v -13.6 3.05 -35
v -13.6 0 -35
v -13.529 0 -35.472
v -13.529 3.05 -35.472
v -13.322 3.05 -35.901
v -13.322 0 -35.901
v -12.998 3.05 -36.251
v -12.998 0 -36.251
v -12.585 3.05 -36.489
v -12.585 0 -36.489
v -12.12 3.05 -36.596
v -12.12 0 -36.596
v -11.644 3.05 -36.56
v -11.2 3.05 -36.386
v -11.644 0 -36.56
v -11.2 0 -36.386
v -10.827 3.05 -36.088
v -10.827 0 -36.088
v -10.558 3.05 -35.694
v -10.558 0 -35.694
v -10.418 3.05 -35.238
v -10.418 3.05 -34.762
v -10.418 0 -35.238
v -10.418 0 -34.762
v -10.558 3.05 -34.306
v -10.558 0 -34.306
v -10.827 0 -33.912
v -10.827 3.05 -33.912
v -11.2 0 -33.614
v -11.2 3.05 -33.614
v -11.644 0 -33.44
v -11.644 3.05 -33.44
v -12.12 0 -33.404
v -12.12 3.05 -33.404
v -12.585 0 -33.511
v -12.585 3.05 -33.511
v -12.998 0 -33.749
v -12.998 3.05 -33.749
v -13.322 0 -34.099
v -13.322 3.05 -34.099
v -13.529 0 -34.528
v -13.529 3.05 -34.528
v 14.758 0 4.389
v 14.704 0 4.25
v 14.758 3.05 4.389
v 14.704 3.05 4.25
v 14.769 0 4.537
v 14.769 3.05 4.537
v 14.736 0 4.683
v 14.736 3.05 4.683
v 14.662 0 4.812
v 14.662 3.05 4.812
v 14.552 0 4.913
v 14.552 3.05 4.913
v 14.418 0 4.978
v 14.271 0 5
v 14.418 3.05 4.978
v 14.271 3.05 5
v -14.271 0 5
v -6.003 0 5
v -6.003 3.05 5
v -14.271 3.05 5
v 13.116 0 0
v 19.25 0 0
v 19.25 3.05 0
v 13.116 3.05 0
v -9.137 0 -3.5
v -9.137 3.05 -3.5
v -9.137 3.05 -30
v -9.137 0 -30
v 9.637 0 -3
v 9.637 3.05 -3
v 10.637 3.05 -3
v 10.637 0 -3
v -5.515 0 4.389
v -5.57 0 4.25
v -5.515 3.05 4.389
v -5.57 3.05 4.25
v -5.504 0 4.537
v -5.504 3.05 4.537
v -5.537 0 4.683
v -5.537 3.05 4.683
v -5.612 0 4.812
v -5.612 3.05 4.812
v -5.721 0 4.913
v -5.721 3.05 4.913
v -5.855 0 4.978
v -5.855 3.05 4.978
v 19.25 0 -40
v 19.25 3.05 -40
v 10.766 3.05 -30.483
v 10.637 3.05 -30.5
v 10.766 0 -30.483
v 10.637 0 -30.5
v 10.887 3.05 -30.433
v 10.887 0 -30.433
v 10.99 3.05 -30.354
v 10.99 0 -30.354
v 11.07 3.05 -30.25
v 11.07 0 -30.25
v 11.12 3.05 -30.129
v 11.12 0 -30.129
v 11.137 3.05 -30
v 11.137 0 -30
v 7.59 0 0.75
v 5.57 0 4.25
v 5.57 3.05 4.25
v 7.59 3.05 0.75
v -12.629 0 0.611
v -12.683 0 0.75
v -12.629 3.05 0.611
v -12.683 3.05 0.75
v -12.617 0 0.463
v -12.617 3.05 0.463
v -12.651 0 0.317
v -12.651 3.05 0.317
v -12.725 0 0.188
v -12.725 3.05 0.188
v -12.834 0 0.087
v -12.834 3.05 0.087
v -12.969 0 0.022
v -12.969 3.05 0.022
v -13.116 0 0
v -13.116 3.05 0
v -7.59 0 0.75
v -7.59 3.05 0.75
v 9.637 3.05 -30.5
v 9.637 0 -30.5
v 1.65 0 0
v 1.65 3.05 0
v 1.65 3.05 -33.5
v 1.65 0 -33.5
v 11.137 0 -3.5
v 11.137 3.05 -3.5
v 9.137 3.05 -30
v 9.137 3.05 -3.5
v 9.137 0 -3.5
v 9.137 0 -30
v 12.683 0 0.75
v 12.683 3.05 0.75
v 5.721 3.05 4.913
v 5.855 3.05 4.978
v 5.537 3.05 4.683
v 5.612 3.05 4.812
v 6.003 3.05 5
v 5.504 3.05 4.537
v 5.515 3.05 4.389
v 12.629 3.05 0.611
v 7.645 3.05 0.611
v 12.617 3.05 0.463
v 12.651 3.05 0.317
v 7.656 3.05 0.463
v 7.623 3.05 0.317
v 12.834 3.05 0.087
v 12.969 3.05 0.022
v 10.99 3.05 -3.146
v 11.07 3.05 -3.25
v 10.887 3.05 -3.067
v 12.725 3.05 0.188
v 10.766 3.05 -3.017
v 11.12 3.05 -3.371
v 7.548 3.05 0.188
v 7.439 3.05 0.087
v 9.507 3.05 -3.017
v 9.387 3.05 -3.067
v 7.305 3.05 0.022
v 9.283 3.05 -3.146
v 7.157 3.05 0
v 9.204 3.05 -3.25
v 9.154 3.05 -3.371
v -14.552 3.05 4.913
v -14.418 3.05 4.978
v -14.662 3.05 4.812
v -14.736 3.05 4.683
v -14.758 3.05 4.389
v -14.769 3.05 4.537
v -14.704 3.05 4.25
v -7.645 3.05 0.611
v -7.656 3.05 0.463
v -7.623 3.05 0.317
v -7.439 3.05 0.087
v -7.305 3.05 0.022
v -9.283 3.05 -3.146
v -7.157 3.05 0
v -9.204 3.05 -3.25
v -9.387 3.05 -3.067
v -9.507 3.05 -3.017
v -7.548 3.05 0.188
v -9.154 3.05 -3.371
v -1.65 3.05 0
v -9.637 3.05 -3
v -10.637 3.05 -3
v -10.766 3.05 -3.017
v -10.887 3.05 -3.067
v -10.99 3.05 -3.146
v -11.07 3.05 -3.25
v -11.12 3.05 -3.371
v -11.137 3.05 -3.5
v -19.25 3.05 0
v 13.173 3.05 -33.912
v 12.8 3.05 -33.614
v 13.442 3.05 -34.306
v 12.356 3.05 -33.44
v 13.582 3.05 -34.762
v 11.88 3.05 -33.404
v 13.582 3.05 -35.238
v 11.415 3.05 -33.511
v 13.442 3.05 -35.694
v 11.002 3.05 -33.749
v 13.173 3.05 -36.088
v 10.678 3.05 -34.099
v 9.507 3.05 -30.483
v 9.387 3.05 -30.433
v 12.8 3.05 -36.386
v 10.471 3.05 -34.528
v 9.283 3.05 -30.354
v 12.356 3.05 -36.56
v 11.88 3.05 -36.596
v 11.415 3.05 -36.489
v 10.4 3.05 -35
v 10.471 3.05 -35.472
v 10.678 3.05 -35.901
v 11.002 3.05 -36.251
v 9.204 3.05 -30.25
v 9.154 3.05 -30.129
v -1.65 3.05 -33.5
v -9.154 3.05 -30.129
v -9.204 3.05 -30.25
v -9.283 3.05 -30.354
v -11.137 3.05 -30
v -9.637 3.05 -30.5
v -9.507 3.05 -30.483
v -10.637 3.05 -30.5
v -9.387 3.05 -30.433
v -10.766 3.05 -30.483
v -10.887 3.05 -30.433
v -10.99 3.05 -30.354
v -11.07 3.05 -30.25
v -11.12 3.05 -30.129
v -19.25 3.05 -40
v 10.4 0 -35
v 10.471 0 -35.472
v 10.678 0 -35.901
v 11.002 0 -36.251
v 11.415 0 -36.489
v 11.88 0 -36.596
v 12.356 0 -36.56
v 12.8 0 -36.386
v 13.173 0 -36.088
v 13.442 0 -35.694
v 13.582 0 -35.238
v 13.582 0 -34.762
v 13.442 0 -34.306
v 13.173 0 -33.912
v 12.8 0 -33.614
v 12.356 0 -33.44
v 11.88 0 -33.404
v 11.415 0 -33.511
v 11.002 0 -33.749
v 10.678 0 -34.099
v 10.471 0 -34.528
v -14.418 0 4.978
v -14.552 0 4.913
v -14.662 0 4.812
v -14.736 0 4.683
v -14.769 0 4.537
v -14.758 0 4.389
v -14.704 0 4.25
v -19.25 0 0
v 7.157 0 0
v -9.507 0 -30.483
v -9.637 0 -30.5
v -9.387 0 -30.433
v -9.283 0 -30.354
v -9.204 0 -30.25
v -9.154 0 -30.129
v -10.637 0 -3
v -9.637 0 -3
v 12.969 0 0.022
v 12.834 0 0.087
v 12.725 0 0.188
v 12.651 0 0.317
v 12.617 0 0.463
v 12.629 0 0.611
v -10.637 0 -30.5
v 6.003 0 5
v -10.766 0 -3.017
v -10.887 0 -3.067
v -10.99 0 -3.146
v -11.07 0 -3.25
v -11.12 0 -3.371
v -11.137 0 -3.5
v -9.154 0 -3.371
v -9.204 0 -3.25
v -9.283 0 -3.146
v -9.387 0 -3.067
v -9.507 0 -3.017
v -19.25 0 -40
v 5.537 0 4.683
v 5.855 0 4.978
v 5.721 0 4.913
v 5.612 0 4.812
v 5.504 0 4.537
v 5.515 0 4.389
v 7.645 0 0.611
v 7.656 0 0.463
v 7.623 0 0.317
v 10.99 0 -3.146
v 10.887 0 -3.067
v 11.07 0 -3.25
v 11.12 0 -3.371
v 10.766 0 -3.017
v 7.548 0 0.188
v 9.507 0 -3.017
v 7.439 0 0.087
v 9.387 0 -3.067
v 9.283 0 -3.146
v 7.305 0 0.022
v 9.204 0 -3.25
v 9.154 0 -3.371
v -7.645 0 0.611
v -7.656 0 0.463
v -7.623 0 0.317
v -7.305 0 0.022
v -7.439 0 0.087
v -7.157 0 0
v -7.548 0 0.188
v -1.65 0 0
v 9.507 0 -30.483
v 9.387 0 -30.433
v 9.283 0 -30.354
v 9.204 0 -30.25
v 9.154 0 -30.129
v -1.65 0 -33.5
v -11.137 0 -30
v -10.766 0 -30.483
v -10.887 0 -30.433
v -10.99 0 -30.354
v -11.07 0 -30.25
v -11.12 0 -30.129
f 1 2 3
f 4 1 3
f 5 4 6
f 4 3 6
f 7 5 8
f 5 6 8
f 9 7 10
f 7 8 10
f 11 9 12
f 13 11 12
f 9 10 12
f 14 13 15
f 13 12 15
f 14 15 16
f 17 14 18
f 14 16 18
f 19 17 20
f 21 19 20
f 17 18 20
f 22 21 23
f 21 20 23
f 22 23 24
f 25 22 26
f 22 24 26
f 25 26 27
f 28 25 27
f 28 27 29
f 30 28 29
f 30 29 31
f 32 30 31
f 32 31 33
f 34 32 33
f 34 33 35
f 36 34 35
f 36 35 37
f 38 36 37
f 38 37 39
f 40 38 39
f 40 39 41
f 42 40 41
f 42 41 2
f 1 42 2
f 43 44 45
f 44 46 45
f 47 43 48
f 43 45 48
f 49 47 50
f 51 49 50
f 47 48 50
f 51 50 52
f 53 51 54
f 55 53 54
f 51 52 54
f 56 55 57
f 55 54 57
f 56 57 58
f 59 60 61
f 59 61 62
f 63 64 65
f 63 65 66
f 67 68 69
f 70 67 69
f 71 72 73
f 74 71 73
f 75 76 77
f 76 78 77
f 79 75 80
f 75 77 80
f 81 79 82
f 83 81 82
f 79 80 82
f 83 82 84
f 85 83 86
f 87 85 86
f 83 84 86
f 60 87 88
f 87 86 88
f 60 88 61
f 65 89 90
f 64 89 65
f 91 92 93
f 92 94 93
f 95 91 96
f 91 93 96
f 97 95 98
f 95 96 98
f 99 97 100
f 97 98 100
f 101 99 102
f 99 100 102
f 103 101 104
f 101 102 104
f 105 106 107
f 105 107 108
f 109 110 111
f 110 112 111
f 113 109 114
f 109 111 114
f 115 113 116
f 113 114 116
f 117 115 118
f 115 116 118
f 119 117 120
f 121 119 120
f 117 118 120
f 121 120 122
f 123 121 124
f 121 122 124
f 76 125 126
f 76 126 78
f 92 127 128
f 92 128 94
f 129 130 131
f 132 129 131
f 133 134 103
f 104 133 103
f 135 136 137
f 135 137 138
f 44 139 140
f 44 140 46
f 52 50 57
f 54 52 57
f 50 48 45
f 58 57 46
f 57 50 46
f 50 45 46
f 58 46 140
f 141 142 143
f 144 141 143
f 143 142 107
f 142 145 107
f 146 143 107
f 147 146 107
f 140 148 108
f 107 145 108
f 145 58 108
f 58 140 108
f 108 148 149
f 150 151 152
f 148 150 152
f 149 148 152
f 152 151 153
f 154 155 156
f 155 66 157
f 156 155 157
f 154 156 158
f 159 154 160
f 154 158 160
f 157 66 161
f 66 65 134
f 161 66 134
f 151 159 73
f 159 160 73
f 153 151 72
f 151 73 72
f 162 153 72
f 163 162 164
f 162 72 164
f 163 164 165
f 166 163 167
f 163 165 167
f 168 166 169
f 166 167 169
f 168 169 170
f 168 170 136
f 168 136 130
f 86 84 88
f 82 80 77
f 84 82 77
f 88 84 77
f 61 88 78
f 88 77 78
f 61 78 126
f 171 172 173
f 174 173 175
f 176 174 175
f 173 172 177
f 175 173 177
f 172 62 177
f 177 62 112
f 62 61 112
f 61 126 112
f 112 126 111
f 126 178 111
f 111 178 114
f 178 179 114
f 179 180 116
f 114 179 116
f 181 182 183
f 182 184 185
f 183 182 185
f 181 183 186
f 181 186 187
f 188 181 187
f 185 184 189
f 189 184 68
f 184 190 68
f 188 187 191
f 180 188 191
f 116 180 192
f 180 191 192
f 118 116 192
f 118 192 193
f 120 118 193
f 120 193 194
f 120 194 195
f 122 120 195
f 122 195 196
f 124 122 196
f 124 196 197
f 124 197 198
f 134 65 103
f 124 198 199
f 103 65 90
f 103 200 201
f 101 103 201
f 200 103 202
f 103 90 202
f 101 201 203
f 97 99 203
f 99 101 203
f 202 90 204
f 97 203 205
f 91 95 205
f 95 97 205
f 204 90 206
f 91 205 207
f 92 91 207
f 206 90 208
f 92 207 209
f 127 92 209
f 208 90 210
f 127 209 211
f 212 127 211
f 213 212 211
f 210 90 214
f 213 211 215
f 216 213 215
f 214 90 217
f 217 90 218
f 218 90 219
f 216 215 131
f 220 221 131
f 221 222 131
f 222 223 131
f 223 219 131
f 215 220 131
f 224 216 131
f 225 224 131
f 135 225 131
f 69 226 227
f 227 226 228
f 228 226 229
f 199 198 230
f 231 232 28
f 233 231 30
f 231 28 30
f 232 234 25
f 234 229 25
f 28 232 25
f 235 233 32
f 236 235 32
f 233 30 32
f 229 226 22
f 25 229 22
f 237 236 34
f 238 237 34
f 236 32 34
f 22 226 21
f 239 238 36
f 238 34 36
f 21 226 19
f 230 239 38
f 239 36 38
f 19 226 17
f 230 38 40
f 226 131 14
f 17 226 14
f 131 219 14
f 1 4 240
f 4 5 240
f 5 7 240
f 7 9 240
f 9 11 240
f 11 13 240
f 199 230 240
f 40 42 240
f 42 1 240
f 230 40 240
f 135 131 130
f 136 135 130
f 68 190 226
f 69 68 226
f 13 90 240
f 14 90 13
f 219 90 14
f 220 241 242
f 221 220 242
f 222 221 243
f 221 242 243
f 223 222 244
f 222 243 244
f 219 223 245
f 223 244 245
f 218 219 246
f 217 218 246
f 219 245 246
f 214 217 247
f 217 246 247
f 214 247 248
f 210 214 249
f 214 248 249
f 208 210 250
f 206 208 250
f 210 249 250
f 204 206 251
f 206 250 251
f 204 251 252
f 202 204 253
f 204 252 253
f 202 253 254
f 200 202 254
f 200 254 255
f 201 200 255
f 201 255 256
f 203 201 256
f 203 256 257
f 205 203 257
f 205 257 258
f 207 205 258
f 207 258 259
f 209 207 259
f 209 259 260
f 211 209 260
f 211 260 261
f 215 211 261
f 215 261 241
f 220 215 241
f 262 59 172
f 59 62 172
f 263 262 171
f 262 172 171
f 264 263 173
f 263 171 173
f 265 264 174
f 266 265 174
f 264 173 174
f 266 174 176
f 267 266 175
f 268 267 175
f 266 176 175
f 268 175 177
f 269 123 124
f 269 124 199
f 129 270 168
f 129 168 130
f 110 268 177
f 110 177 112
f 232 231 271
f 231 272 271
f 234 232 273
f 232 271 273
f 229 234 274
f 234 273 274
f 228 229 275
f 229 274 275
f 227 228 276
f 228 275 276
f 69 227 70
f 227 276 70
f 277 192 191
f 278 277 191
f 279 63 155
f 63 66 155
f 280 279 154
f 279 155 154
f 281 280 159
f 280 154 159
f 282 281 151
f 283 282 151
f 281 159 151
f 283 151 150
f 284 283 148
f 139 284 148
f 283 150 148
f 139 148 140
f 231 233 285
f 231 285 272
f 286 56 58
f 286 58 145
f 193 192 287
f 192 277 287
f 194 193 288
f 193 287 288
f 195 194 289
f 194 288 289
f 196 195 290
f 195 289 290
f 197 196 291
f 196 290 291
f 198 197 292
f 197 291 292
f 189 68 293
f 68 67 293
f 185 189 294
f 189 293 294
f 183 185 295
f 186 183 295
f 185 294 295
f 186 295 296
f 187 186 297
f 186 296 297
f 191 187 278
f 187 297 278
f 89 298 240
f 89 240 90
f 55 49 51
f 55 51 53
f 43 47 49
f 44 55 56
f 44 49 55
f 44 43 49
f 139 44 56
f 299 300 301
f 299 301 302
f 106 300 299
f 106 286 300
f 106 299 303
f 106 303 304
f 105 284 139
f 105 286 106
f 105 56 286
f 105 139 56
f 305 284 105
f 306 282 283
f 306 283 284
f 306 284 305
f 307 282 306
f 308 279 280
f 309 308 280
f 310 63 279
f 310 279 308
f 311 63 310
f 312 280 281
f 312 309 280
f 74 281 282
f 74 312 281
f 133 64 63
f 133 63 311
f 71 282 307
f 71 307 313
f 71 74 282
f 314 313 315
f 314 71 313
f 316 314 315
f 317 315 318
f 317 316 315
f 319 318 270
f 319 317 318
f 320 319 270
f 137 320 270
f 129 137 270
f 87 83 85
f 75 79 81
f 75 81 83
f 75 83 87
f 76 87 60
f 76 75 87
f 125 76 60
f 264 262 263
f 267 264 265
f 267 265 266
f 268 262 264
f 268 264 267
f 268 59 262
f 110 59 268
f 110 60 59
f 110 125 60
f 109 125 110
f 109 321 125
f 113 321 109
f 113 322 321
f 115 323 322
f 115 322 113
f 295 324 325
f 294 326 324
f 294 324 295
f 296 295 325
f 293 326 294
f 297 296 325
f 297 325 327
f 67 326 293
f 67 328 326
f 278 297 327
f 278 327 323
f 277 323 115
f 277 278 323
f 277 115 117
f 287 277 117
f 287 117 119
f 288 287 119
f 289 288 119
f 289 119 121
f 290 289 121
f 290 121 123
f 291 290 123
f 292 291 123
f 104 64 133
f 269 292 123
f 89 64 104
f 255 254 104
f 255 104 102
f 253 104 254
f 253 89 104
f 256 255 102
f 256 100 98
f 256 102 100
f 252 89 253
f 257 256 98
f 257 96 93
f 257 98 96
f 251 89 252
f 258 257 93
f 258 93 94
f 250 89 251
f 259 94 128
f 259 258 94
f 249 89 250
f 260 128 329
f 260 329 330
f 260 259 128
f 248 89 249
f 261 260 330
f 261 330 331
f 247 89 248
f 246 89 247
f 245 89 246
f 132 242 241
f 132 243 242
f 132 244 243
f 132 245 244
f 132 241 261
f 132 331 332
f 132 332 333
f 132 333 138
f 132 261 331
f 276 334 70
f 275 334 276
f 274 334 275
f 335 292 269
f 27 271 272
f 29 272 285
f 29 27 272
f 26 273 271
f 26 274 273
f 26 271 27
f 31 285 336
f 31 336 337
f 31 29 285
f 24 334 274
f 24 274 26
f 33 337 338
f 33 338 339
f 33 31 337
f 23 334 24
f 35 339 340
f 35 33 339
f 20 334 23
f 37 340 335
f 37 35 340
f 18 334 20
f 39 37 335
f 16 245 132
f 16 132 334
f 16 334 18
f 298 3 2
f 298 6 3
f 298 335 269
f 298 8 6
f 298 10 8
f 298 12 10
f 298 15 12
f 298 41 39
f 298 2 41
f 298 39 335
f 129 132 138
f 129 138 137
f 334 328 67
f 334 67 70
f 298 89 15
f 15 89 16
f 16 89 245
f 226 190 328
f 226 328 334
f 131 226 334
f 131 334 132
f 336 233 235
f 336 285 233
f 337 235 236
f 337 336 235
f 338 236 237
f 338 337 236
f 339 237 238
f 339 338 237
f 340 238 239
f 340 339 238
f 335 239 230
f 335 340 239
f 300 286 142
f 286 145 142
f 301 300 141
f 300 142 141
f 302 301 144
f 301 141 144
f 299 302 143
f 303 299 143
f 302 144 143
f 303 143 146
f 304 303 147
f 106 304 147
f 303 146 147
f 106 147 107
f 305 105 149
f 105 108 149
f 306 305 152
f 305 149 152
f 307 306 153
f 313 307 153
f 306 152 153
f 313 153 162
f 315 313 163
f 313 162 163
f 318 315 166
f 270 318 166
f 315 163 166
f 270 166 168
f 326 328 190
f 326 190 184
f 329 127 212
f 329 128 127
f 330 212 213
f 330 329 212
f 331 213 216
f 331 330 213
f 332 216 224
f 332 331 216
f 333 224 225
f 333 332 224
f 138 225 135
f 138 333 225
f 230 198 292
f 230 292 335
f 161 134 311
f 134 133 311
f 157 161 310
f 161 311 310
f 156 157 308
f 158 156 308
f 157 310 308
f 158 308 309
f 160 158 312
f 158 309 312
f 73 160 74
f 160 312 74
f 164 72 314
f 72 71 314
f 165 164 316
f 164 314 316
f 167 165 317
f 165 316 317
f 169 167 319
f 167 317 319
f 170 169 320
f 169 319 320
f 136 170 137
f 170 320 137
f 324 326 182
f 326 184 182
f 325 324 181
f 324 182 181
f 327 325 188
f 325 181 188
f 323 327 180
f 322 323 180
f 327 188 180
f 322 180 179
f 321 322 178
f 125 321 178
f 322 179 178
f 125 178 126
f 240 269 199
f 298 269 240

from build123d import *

# Parameters (mm, degrees)
BOSS_EXTRUDE1_DEPTH         = 3.05
FILLET1_R                   = 0.5
SKETCH3_W                   = 3.3
SKETCH3_H                   = 61.8
SKETCH3_H_2                 = 1
CUT_EXTRUDE2_DEPTH          = 45.495673947
SKETCH8_W                   = 2
SKETCH8_H                   = 27.5
CUT_EXTRUDE3_DEPTH          = 45.495673947
FILLET2_R                   = 0.5
M3_CLEARANCE_DAMPER_HOLES_D = 3.2


with BuildPart() as part:
    # Sketch1 → Boss-Extrude1 (new body)
    with BuildSketch(Plane(origin=(0, 0, 0), x_dir=(1, 0, 0), z_dir=(0, 1, 0))):
        Polygon((-19.25, 0), (-19.25, 40), (19.25, 40), (19.25, 0), (12.25, 0), (15.136751346, -5), (5.136751346, -5), (8.023502692, 0), (-8.023502692, 0), (-5.136751346, -5), (-15.136751346, -5), (-12.25, 0), align=None)
    extrude(amount=BOSS_EXTRUDE1_DEPTH)

    # Fillet1
    fillet1_edges = [part.edges().sort_by_distance(p)[0] for p in [
        (12.25, 1.525, 0),
        (15.136751346, 1.525, 5),
        (5.136751346, 1.525, 5),
        (8.023502692, 1.525, 0),
        (-8.023502692, 1.525, 0),
        (-5.136751346, 1.525, 5),
        (-15.136751346, 1.525, 5),
        (-12.25, 1.525, 0),
    ]]
    fillet(fillet1_edges, radius=FILLET1_R)

    # Sketch3 → Cut-Extrude2 (cut, through all)
    with BuildSketch(Plane(origin=(0, 3.05, 0), x_dir=(1, 0, 0), z_dir=(0, 1, 0))):
        with Locations((0, 2.6)):
            Rectangle(SKETCH3_W, SKETCH3_H)
        with Locations((0, -30)):
            Rectangle(SKETCH3_W, SKETCH3_H_2)
    extrude(amount=-CUT_EXTRUDE2_DEPTH, mode=Mode.SUBTRACT)

    # Sketch8 → Cut-Extrude3 (cut, through all)
    with BuildSketch(Plane(origin=(0, 3.05, 0), x_dir=(1, 0, 0), z_dir=(0, 1, 0))):
        with Locations((-10.136751346, 16.75)):
            Rectangle(SKETCH8_W, SKETCH8_H)
        with Locations((10.136751346, 16.75)):
            Rectangle(SKETCH8_W, SKETCH8_H)
    extrude(amount=-CUT_EXTRUDE3_DEPTH, mode=Mode.SUBTRACT)

    # Fillet2
    fillet2_edges = [part.edges().sort_by_distance(p)[0] for p in [
        (-11.136751346, 1.525, -3),
        (-11.136751346, 1.525, -30.5),
        (-9.136751346, 1.525, -30.5),
        (-9.136751346, 1.525, -3),
        (11.136751346, 1.525, -30.5),
        (11.136751346, 1.525, -3),
        (9.136751346, 1.525, -3),
        (9.136751346, 1.525, -30.5),
    ]]
    fillet(fillet2_edges, radius=FILLET2_R)

    # M3 Clearance Damper Holes (through all)
    with Locations(Plane(origin=(0, 3.05, 0), x_dir=(1, 0, 0), z_dir=(0, 1, 0))):
        with Locations((-12, 35), (12, 35)):
            Hole(M3_CLEARANCE_DAMPER_HOLES_D / 2)


solid = part.part
